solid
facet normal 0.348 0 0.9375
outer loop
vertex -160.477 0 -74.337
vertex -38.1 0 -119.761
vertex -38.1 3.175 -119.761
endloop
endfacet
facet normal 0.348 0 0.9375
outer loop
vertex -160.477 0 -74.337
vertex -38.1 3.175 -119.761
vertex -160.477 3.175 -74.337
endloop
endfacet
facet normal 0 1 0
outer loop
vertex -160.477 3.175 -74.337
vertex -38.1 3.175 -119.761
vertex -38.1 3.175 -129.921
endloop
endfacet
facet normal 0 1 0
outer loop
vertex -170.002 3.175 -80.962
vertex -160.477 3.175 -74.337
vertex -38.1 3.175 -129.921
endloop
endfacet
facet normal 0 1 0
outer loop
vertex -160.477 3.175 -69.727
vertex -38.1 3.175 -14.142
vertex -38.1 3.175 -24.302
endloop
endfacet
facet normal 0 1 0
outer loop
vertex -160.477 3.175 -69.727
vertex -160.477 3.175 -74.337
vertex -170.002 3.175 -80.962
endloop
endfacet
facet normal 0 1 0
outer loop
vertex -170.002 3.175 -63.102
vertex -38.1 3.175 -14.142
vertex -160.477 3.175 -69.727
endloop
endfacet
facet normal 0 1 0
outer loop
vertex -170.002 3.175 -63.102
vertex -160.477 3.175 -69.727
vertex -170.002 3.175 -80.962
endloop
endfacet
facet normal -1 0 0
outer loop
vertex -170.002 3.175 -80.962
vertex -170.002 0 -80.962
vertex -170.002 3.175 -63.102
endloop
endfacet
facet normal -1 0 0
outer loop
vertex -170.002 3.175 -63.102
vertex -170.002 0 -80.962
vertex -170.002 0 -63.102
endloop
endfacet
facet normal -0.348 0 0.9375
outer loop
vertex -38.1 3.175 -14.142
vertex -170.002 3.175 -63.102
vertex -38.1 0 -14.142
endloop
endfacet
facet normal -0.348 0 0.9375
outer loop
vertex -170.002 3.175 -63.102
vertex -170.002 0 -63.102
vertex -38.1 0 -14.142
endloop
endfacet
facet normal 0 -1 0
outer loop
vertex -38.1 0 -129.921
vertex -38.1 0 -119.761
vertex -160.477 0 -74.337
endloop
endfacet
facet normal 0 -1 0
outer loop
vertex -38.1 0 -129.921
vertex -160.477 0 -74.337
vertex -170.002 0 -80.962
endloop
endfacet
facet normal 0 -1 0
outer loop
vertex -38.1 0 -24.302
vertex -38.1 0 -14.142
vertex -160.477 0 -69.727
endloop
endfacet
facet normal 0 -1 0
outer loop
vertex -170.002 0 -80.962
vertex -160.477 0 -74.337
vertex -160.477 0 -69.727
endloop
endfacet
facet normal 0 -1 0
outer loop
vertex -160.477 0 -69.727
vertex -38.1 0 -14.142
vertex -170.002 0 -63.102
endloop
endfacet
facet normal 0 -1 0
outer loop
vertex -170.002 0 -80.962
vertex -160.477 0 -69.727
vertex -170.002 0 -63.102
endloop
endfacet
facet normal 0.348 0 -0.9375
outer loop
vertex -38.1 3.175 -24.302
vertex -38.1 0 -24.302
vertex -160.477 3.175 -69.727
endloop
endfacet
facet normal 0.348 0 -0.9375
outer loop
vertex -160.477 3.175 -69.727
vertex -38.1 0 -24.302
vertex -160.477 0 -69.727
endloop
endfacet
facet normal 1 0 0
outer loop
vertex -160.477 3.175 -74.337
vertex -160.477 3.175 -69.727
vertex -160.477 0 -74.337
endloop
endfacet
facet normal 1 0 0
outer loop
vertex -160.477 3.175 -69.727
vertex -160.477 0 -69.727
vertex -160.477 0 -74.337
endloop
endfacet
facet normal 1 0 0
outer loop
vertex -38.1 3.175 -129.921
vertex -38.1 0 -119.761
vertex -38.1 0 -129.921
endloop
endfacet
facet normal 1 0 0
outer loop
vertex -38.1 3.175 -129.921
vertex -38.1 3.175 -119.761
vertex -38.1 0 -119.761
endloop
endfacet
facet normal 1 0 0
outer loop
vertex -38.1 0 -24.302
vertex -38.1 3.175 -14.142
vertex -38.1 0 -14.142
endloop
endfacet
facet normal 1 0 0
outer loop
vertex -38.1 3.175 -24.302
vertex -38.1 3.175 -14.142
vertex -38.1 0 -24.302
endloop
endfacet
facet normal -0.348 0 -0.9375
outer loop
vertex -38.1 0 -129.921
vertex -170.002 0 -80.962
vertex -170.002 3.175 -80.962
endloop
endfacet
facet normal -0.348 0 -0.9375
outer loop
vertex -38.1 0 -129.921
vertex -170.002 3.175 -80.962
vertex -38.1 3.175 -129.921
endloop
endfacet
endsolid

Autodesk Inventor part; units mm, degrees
ref_plane "YZ Plane" through (0, 0, 0) normal (1, 0, 0) x (0, 1, 0)
ref_plane "XZ Plane" through (0, 0, 0) normal (0, 1, 0) x (-1, 0, 0)
ref_plane "XY Plane" through (0, 0, 0) normal (0, 0, 1) x (1, 0, 0)
sketch "Sketch1" plane through (0, 0, 0) normal (0, 1, 0) x (-1, 0, 0)
  line L0 (0, 0) -> (0, -10.16)
  line L1 (0, -10.16) -> (166.6875, -72.0318)
  line L2 (166.6875, -72.0318) -> (170.0021, -63.1021)
  line L3 (170.0021, -63.1021) -> (0, 0)
  line L4 (0, -133.9036) -> (166.6875, -72.0318)
  line L5 (170.0021, -80.9615) -> (0, -144.0636)
  line L6 (0, -144.0636) -> (0, -133.9036)
  line L7 (166.6875, -72.0318) -> (170.0021, -80.9615)
  line L8 (170.0021, -63.1021) -> (160.4771, -63.1021)
  line L9 (160.4771, -63.1021) -> (160.4771, -80.9615)
  line L10 (160.4771, -80.9615) -> (170.0021, -80.9615)
  line L11 (170.0021, -80.9615) -> (170.0021, -63.1021)
  line L12 (0, 0) -> (38.1, 0)
  line L13 (38.1, 0) -> (38.1, -144.0636)
  line L14 (38.1, -144.0636) -> (0, -144.0636)
  line L15 (0, -144.0636) -> (0, 0)
  point P0 (160.4771, -69.7266)
  point P1 (160.4771, -74.337)
  dimension "d0" = 10.16
  dimension "d1" = 9.525
  dimension "d2" = 177.8
  dimension "d3" = 177.8
  dimension "d4" = 10.16
  dimension "d5" = 9.525
  dimension "d6" = 9.525
  dimension "d9" = 38.1
extrude "Extrusion1" add sketch "Sketch1" along normal blind 3.175 contours L3 L13 L1 L0 | L3 L8 L9 L1 L13 | L4 L13 L5 L6 | L11 L7 L2 | L2 L1 L9 L8 | L1 L4 L9 | L4 L9 L10 L5 L13 | L7 L10 L9 L4
sketch "Sketch2" plane through (0, 3.175, 0) normal (0, 1, 0) x (1, 0, 0)
  line L0 (0, 0) -> (0, 10.16) projected
  line L1 (0, 0) -> (-38.1, 0)
  line L2 (-38.1, 0) -> (-38.1, 144.0636)
  line L3 (-38.1, 144.0636) -> (0, 144.0636)
  line L4 (0, 144.0636) -> (0, 0)
  dimension "d10" = 38.1
extrude "Extrusion2" cut sketch "Sketch2" against normal blind 3.175
properties part number "Projectile Launcher Back" material "Wood (Birch)"
